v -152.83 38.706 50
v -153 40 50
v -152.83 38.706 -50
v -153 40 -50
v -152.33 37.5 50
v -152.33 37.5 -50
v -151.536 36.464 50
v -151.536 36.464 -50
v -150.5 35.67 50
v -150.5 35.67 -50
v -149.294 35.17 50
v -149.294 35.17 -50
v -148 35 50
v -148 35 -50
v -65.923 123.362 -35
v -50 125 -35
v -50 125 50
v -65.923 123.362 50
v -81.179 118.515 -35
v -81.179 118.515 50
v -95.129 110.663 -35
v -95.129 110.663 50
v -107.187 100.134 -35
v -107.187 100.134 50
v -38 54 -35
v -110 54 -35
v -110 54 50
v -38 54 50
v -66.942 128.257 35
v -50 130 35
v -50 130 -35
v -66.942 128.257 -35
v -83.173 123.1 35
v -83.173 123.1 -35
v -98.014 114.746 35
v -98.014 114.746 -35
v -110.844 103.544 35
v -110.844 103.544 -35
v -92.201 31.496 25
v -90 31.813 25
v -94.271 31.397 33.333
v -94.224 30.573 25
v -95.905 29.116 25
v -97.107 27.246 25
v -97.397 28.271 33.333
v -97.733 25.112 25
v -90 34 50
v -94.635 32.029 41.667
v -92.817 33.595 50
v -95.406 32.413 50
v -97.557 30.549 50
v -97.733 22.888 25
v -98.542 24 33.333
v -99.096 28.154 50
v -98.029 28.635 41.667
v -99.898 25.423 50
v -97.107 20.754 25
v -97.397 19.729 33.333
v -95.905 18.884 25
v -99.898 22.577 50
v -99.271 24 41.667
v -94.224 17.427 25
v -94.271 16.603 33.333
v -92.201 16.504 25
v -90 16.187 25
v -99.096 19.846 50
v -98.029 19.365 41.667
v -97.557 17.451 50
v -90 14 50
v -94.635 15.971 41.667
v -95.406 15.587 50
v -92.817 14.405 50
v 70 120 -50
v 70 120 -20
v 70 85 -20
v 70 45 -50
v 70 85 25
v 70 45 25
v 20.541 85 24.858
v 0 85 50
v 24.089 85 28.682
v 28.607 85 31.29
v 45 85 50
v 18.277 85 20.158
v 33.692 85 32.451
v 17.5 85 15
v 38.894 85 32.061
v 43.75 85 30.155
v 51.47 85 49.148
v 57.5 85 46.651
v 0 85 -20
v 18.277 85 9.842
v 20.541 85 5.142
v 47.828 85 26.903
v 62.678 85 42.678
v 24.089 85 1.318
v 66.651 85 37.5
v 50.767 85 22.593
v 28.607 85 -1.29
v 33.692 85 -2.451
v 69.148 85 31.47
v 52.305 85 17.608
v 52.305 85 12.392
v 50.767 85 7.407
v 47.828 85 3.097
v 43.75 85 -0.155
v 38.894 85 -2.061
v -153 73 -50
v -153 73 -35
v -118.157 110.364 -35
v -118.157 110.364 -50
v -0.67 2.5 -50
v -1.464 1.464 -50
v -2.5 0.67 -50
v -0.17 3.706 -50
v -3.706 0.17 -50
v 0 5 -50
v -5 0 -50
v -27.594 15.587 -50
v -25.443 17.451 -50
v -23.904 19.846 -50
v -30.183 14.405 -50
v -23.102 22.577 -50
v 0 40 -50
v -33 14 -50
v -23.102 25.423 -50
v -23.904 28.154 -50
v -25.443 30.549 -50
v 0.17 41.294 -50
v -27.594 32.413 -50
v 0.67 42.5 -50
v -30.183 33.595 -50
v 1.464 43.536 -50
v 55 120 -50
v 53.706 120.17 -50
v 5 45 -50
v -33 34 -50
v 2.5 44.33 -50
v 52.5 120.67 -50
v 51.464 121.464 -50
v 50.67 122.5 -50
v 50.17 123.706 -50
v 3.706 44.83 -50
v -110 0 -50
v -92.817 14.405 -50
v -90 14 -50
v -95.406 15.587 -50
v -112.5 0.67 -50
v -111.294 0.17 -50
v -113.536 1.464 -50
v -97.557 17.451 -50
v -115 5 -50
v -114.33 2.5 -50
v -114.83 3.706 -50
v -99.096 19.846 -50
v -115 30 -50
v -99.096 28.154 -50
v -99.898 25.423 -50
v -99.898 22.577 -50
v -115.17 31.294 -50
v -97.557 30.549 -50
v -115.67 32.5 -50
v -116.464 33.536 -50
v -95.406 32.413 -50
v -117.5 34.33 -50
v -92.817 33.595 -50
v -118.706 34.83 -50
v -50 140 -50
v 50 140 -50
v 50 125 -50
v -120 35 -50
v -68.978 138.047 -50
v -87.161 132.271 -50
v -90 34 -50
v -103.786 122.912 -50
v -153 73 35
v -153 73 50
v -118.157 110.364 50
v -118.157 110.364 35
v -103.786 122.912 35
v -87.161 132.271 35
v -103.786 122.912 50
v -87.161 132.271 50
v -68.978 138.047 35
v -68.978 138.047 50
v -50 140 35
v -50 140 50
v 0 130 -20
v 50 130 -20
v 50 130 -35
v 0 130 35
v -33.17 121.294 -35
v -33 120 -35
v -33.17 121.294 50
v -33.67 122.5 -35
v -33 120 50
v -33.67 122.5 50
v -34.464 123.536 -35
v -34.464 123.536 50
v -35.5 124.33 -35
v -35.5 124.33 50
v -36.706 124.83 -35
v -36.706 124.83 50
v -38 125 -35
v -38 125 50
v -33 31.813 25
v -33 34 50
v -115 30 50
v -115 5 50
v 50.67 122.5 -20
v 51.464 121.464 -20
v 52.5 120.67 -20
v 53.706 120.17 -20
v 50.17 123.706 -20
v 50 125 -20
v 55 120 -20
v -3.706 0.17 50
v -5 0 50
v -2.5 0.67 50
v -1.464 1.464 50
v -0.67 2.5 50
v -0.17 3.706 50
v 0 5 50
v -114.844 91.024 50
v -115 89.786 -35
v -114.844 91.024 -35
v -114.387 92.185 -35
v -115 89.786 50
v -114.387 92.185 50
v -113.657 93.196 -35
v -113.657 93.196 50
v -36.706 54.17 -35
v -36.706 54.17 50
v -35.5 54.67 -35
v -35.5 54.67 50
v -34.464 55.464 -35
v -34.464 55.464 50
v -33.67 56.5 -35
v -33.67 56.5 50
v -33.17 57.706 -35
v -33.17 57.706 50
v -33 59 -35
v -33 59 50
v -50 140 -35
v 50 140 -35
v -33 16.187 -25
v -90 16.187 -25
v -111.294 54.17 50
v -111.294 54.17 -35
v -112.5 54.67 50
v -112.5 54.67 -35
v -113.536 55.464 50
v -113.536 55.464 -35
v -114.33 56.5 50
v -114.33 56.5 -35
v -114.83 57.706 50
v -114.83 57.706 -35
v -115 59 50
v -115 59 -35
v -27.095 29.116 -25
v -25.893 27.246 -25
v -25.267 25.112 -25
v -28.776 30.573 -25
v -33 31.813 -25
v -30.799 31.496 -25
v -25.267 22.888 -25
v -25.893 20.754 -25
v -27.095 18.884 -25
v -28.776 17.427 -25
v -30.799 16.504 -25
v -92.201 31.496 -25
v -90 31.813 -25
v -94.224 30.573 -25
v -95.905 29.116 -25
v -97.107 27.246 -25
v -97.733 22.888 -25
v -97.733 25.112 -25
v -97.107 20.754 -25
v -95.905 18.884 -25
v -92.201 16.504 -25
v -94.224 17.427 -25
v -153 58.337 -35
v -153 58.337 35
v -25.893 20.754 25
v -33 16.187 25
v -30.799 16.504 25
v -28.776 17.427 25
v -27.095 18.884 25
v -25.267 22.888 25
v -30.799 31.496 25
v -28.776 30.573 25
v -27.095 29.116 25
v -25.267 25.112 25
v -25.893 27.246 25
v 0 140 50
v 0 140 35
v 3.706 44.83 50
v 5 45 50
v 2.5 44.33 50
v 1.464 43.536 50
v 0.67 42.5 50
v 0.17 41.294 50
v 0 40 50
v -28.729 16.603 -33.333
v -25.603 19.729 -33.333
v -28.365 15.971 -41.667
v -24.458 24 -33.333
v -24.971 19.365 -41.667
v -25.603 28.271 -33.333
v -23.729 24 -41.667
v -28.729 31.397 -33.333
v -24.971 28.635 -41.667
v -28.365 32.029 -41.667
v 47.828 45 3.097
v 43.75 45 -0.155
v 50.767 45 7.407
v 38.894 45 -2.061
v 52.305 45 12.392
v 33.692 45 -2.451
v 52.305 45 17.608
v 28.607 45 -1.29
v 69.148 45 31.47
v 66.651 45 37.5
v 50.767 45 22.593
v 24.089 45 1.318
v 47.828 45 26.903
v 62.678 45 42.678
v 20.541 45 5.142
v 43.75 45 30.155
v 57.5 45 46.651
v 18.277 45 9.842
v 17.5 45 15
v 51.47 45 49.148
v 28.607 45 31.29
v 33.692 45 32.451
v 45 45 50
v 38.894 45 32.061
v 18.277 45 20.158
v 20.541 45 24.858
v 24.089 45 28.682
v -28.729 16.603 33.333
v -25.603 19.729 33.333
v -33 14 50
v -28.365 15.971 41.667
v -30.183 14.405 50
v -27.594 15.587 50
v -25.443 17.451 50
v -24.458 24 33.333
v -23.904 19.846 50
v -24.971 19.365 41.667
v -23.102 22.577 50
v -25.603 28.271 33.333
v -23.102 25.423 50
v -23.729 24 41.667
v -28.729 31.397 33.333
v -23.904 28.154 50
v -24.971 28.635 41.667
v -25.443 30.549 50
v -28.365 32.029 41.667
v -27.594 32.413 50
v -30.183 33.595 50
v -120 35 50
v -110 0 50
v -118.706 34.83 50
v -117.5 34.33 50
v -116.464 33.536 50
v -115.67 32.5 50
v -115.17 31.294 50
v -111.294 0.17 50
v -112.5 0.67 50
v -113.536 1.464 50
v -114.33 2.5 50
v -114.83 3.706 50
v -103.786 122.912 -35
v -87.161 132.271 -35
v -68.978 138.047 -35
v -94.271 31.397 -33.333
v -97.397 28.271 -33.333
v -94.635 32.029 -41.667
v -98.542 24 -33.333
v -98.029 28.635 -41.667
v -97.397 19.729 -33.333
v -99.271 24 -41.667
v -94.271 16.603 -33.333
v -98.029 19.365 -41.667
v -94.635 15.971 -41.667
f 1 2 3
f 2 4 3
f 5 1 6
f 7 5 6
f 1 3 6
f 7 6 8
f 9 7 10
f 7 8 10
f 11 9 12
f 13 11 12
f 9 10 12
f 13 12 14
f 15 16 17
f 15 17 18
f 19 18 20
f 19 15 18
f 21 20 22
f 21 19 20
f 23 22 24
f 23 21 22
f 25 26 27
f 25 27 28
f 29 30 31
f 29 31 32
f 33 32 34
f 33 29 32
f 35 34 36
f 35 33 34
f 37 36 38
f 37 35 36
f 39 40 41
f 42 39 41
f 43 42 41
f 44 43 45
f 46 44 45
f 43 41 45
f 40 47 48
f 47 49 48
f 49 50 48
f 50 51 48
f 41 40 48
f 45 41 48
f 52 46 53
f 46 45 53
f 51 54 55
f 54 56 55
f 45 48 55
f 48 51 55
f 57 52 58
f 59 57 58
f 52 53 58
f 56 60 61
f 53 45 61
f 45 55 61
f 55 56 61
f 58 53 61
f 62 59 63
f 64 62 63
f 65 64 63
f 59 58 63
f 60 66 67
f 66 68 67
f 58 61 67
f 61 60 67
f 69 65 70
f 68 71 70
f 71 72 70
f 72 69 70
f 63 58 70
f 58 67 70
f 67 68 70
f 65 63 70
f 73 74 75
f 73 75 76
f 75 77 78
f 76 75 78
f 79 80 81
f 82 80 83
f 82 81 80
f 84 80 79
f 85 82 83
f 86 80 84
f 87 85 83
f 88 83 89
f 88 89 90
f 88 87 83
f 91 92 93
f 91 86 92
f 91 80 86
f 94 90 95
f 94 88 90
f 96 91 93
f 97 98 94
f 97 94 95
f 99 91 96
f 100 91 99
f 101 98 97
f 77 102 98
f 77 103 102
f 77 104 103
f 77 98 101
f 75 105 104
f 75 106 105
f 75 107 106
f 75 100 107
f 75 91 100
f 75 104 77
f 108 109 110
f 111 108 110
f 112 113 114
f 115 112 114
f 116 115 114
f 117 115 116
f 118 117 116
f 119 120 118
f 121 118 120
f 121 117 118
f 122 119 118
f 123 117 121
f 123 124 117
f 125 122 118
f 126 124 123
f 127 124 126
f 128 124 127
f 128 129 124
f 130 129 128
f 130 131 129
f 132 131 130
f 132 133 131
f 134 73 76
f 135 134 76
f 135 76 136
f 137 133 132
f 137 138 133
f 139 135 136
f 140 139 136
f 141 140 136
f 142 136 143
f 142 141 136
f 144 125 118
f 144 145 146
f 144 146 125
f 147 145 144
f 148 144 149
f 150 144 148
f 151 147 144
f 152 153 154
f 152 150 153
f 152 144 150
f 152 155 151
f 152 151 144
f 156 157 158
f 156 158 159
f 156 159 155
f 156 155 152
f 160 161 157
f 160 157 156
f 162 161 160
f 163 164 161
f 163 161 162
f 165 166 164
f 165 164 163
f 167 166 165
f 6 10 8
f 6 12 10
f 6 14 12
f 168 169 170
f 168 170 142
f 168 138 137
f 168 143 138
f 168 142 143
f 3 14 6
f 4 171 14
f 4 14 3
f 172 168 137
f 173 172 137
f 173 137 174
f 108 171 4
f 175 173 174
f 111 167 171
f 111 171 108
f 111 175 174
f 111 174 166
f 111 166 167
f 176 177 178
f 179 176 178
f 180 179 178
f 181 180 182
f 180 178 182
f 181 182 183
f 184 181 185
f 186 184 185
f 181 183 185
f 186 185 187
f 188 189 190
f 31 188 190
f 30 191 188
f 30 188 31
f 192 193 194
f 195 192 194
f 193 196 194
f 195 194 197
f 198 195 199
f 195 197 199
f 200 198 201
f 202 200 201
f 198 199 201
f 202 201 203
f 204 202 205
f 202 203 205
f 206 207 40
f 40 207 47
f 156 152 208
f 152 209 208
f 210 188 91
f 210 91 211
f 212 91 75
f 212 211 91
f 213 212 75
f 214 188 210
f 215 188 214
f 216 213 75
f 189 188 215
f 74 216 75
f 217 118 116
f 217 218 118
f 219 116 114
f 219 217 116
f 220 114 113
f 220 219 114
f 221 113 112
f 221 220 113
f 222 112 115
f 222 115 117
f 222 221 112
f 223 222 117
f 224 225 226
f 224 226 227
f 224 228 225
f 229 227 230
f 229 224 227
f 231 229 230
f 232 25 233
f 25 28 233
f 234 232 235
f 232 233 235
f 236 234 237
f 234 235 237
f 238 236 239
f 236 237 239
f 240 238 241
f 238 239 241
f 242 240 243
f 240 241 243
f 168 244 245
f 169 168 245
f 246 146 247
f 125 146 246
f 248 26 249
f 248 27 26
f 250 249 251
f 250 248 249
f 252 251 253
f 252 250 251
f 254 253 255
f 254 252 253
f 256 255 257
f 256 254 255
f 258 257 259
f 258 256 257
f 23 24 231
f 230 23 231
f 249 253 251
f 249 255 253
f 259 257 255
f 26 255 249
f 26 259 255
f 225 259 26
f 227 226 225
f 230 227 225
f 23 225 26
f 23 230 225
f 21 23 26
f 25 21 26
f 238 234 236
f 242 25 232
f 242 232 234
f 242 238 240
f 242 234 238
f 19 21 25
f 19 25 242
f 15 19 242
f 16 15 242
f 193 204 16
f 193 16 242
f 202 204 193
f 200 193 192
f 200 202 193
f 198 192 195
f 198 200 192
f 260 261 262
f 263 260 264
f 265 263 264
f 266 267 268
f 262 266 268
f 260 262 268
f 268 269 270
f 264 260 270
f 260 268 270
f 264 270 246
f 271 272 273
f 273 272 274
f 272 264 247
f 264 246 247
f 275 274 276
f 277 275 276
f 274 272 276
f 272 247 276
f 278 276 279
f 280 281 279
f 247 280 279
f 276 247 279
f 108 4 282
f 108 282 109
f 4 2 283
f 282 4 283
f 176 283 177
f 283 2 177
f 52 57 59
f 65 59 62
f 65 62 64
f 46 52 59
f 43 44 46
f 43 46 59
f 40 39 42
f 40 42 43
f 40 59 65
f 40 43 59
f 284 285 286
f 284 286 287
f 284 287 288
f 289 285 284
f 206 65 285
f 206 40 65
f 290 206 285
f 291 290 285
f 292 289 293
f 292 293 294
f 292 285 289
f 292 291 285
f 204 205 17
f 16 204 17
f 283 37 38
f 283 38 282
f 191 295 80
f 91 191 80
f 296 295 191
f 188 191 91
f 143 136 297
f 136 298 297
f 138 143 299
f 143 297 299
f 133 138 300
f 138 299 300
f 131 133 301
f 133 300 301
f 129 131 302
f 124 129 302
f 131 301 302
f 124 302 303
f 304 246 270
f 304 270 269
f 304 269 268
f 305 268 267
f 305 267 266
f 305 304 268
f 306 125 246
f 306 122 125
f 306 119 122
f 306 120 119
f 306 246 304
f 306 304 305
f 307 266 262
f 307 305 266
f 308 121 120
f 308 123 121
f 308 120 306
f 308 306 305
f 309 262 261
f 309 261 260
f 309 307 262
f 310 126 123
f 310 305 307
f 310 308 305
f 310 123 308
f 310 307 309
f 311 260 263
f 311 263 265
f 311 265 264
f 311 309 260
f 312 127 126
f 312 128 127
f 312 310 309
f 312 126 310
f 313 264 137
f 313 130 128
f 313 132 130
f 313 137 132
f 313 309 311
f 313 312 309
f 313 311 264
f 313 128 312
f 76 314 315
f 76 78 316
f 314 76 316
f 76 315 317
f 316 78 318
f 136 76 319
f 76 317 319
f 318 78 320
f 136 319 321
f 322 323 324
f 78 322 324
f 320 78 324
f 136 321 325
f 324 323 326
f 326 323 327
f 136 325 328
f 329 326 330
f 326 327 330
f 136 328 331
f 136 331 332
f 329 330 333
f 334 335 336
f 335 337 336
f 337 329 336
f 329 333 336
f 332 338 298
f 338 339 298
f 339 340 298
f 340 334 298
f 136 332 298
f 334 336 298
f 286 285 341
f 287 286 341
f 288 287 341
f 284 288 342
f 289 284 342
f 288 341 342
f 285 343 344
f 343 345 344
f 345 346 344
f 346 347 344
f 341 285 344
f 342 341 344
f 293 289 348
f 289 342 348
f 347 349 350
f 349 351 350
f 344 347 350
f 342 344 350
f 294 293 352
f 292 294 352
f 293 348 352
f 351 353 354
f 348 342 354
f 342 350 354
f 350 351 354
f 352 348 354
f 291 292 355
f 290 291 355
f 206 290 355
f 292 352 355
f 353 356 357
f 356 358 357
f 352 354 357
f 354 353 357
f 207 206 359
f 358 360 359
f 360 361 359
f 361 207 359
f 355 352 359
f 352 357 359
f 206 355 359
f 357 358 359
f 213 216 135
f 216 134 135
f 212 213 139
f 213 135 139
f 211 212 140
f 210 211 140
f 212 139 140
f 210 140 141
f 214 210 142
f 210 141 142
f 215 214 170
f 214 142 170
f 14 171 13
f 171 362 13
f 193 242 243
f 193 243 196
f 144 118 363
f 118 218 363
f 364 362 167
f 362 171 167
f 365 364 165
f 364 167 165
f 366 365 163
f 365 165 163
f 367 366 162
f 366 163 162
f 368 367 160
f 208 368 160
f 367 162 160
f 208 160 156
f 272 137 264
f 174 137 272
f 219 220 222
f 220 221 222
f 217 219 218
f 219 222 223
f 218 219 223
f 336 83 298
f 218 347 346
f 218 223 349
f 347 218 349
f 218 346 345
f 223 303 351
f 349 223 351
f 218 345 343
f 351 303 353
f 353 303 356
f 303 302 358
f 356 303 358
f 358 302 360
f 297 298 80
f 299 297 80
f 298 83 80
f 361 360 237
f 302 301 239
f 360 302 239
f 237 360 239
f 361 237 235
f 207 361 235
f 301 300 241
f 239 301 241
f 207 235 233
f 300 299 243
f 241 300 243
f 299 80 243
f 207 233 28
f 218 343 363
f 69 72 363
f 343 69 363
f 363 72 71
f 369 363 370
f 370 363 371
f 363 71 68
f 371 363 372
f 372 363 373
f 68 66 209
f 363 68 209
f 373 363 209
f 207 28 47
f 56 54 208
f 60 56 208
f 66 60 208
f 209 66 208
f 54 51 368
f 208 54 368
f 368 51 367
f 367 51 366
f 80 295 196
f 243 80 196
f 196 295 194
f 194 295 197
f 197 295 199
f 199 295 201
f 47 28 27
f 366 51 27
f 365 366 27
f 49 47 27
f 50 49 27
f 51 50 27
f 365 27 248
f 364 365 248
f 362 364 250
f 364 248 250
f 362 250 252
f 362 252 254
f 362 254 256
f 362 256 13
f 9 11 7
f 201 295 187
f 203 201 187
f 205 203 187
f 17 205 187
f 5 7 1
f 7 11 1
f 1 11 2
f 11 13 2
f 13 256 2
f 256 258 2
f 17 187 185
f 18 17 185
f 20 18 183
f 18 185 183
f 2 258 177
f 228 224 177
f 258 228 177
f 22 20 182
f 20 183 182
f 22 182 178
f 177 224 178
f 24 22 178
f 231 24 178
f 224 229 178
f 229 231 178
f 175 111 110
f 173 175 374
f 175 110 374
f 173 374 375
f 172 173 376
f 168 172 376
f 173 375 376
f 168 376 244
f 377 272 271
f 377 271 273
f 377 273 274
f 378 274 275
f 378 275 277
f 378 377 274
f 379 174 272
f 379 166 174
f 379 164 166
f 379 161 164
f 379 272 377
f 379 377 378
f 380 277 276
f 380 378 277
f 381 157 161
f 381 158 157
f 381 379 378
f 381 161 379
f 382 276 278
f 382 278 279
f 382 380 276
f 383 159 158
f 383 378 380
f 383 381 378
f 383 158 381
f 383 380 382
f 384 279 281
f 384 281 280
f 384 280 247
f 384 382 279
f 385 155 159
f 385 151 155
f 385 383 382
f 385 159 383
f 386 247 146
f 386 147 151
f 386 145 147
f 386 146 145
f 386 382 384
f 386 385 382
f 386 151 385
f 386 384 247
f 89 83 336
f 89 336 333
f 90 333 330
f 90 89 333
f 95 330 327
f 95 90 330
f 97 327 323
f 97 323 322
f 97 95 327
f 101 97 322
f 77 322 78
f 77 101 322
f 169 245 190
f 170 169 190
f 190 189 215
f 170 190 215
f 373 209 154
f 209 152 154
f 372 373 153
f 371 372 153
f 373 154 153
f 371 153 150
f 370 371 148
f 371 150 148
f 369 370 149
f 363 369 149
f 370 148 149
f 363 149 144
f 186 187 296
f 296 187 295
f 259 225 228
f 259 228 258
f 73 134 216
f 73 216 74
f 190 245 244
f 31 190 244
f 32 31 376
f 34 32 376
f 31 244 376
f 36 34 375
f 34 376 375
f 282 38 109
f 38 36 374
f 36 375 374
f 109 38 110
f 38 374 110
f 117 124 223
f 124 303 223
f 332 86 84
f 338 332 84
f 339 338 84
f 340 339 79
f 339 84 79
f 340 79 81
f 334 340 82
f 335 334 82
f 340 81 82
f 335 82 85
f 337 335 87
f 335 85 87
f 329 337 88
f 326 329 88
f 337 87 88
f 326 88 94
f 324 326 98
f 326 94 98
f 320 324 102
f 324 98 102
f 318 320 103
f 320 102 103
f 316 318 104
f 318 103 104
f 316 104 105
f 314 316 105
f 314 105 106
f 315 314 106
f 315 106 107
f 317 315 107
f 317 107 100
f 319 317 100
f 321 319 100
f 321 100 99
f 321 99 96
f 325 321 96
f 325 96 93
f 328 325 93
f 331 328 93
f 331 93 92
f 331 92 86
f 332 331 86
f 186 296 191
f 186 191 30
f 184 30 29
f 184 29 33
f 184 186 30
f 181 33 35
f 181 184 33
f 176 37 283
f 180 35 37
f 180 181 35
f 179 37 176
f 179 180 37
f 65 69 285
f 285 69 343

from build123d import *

# Parameters (mm, degrees)
BOSS_EXTRUDE1_DEPTH     = 50
CUT_EXTRUDE1_DEPTH      = 231.236834586
CUT_EXTRUDE1_DEPTH_BACK = 85
SKETCH3_W               = 70
SKETCH3_H               = 70
CUT_EXTRUDE2_DEPTH      = 55
SKETCH4_R               = 17.5
CUT_EXTRUDE3_DEPTH      = 183.027470454
CUT_EXTRUDE4_DEPTH      = 35
FILLET1_R               = 5
FILLET2_R               = 5
CUT_EXTRUDE5_DEPTH      = 25
CUT_EXTRUDE5_DRAFT      = -5
MIRROR1_COPY_1_DEPTH    = 25
MIRROR1_COPY_1_DRAFT    = -5


with BuildPart() as part:
    # Sketch1 → Boss-Extrude1 (new, symmetric)
    with BuildSketch(Plane.XY):
        with BuildLine():
            Line((0, 0), (-115, 0))
            Line((-115, 0), (-115, 35))
            Line((-115, 35), (-153, 35))
            Line((-153, 35), (-153, 73))
            Line((-153, 73), (-118.15707843, 110.364458857))
            ThreePointArc((-118.15707843, 110.364458857), (-87.160639926, 132.270575779), (-50, 140))
            Line((-50, 140), (50, 140))
            Line((50, 140), (50, 120))
            Line((50, 120), (70, 120))
            Line((70, 120), (70, 45))
            Line((70, 45), (0, 45))
            Line((0, 45), (0, 0))
        make_face()
    extrude(amount=BOSS_EXTRUDE1_DEPTH, both=True)

    # Sketch2 → Cut-Extrude1 (cut, two sides: drawn at the far end of the back side and taken through both)
    with BuildSketch(Plane.XY.offset(50).offset(-CUT_EXTRUDE1_DEPTH_BACK)):
        with BuildLine():
            Line((-33, 54), (-33, 125))
            Line((-33, 125), (-50, 125))
            ThreePointArc((-50, 125), (-81.179403892, 118.514674664), (-107.186772906, 100.134483456))
            Line((-107.186772906, 100.134483456), (-115, 91.755823196))
            Line((-115, 91.755823196), (-115, 54))
            Line((-115, 54), (-33, 54))
        make_face()
    extrude(amount=CUT_EXTRUDE1_DEPTH + CUT_EXTRUDE1_DEPTH_BACK, mode=Mode.SUBTRACT)

    # Sketch3 → Cut-Extrude2 (cut)
    with BuildSketch(Plane(origin=(0, 140, 0), x_dir=(1, 0, 0), z_dir=(0, 1, 0))):
        with Locations((35, -15)):
            Rectangle(SKETCH3_W, SKETCH3_H)
    extrude(amount=-CUT_EXTRUDE2_DEPTH, mode=Mode.SUBTRACT)

    # Sketch4 → Cut-Extrude3 (cut, through all)
    with BuildSketch(Plane(origin=(0, 85, 0), x_dir=(1, 0, 0), z_dir=(0, 1, 0))):
        with Locations(Location((35, -15, 0), (0, 0, 180))):
            Circle(SKETCH4_R)
        with BuildLine():
            Line((70, -25), (70, -50))
            Line((70, -50), (45, -50))
            ThreePointArc((45, -50), (62.67766953, -42.67766953), (70, -25))
        make_face()
    extrude(amount=-CUT_EXTRUDE3_DEPTH, mode=Mode.SUBTRACT)

    # Sketch5 → Cut-Extrude4 (cut, symmetric)
    with BuildSketch(Plane.XY):
        with BuildLine():
            Line((-110.843541414, 103.544475257), (-153, 58.337208144))
            Line((-153, 58.337208144), (-153, 73))
            Line((-153, 73), (-118.15707843, 110.364458857))
            ThreePointArc((-118.15707843, 110.364458857), (-87.160639926, 132.270575779), (-50, 140))
            Line((-50, 140), (0, 140))
            Line((0, 140), (50, 140))
            Line((50, 140), (50, 130))
            Line((50, 130), (0, 130))
            Line((0, 130), (-50, 130))
            ThreePointArc((-50, 130), (-83.173149237, 123.099975036), (-110.843541414, 103.544475257))
        make_face()
    extrude(amount=CUT_EXTRUDE4_DEPTH, both=True, mode=Mode.SUBTRACT)

    # Fillet1
    fillet1_edges = [part.edges().sort_by_distance(p)[0] for p in [
        (-115, 91.755823196, 7.5),
        (-33, 125, 7.5),
        (-33, 54, 7.5),
        (-115, 54, 7.5),
    ]]
    fillet(fillet1_edges, radius=FILLET1_R)

    # Fillet2
    fillet2_edges = [part.edges().sort_by_distance(p)[0] for p in [
        (0, 0, 0),
        (-115, 0, 0),
        (-115, 35, 0),
        (-153, 35, 0),
        (0, 45, 0),
        (50, 120, -35),
    ]]
    fillet(fillet2_edges, radius=FILLET2_R)


with BuildPart() as cut_extrude5_tool:
    # Sketch6 → Cut-Extrude5 (with draft: the straight prism first)
    with BuildSketch(Plane.XY.offset(50)):
        with BuildLine():
            ThreePointArc((-90, 34), (-100, 24), (-90, 14))
            Line((-90, 14), (-33, 14))
            ThreePointArc((-33, 14), (-23, 24), (-33, 34))
            Line((-33, 34), (-90, 34))
        make_face()
    extrude(amount=-CUT_EXTRUDE5_DEPTH)
    # Cut-Extrude5: the draft: its side faces are tilted about the plane it starts from
    cut_extrude5_sides = [cut_extrude5_tool.faces().sort_by_distance(p)[0] for p in [
        (-23, 24, 37.5),
        (-61.5, 34, 37.5),
        (-100, 24, 37.5),
        (-61.5, 14, 37.5),
    ]]
    draft(cut_extrude5_sides, Plane.XY.offset(50), CUT_EXTRUDE5_DRAFT)


with BuildPart() as part_1:
    add(part.part)

    # Cut-Extrude5: cut by cut_extrude5_tool
    add(cut_extrude5_tool.part, mode=Mode.SUBTRACT)


with BuildPart() as mirror1_copy_1_tool:
    # Mirror1 copy 1 sketch → Mirror1 copy 1 (with draft: the straight prism first)
    with BuildSketch(Plane(origin=(0, 0, -50), x_dir=(1, 0, 0), z_dir=(0, 0, -1))):
        with BuildLine():
            ThreePointArc((-90, -34), (-100, -24), (-90, -14))
            Line((-90, -14), (-33, -14))
            ThreePointArc((-33, -14), (-23, -24), (-33, -34))
            Line((-33, -34), (-90, -34))
        make_face()
    extrude(amount=-MIRROR1_COPY_1_DEPTH)
    # Mirror1 copy 1: the draft: its side faces are tilted about the plane it starts from
    mirror1_copy_1_sides = [mirror1_copy_1_tool.faces().sort_by_distance(p)[0] for p in [
        (-23, 24, -37.5),
        (-61.5, 34, -37.5),
        (-100, 24, -37.5),
        (-61.5, 14, -37.5),
    ]]
    draft(mirror1_copy_1_sides, Plane(origin=(0, 0, -50), x_dir=(1, 0, 0), z_dir=(0, 0, -1)), MIRROR1_COPY_1_DRAFT)


with BuildPart() as part_2:
    add(part_1.part)

    # Mirror1 copy 1: cut by mirror1_copy_1_tool
    add(mirror1_copy_1_tool.part, mode=Mode.SUBTRACT)


solid = part_2.part
